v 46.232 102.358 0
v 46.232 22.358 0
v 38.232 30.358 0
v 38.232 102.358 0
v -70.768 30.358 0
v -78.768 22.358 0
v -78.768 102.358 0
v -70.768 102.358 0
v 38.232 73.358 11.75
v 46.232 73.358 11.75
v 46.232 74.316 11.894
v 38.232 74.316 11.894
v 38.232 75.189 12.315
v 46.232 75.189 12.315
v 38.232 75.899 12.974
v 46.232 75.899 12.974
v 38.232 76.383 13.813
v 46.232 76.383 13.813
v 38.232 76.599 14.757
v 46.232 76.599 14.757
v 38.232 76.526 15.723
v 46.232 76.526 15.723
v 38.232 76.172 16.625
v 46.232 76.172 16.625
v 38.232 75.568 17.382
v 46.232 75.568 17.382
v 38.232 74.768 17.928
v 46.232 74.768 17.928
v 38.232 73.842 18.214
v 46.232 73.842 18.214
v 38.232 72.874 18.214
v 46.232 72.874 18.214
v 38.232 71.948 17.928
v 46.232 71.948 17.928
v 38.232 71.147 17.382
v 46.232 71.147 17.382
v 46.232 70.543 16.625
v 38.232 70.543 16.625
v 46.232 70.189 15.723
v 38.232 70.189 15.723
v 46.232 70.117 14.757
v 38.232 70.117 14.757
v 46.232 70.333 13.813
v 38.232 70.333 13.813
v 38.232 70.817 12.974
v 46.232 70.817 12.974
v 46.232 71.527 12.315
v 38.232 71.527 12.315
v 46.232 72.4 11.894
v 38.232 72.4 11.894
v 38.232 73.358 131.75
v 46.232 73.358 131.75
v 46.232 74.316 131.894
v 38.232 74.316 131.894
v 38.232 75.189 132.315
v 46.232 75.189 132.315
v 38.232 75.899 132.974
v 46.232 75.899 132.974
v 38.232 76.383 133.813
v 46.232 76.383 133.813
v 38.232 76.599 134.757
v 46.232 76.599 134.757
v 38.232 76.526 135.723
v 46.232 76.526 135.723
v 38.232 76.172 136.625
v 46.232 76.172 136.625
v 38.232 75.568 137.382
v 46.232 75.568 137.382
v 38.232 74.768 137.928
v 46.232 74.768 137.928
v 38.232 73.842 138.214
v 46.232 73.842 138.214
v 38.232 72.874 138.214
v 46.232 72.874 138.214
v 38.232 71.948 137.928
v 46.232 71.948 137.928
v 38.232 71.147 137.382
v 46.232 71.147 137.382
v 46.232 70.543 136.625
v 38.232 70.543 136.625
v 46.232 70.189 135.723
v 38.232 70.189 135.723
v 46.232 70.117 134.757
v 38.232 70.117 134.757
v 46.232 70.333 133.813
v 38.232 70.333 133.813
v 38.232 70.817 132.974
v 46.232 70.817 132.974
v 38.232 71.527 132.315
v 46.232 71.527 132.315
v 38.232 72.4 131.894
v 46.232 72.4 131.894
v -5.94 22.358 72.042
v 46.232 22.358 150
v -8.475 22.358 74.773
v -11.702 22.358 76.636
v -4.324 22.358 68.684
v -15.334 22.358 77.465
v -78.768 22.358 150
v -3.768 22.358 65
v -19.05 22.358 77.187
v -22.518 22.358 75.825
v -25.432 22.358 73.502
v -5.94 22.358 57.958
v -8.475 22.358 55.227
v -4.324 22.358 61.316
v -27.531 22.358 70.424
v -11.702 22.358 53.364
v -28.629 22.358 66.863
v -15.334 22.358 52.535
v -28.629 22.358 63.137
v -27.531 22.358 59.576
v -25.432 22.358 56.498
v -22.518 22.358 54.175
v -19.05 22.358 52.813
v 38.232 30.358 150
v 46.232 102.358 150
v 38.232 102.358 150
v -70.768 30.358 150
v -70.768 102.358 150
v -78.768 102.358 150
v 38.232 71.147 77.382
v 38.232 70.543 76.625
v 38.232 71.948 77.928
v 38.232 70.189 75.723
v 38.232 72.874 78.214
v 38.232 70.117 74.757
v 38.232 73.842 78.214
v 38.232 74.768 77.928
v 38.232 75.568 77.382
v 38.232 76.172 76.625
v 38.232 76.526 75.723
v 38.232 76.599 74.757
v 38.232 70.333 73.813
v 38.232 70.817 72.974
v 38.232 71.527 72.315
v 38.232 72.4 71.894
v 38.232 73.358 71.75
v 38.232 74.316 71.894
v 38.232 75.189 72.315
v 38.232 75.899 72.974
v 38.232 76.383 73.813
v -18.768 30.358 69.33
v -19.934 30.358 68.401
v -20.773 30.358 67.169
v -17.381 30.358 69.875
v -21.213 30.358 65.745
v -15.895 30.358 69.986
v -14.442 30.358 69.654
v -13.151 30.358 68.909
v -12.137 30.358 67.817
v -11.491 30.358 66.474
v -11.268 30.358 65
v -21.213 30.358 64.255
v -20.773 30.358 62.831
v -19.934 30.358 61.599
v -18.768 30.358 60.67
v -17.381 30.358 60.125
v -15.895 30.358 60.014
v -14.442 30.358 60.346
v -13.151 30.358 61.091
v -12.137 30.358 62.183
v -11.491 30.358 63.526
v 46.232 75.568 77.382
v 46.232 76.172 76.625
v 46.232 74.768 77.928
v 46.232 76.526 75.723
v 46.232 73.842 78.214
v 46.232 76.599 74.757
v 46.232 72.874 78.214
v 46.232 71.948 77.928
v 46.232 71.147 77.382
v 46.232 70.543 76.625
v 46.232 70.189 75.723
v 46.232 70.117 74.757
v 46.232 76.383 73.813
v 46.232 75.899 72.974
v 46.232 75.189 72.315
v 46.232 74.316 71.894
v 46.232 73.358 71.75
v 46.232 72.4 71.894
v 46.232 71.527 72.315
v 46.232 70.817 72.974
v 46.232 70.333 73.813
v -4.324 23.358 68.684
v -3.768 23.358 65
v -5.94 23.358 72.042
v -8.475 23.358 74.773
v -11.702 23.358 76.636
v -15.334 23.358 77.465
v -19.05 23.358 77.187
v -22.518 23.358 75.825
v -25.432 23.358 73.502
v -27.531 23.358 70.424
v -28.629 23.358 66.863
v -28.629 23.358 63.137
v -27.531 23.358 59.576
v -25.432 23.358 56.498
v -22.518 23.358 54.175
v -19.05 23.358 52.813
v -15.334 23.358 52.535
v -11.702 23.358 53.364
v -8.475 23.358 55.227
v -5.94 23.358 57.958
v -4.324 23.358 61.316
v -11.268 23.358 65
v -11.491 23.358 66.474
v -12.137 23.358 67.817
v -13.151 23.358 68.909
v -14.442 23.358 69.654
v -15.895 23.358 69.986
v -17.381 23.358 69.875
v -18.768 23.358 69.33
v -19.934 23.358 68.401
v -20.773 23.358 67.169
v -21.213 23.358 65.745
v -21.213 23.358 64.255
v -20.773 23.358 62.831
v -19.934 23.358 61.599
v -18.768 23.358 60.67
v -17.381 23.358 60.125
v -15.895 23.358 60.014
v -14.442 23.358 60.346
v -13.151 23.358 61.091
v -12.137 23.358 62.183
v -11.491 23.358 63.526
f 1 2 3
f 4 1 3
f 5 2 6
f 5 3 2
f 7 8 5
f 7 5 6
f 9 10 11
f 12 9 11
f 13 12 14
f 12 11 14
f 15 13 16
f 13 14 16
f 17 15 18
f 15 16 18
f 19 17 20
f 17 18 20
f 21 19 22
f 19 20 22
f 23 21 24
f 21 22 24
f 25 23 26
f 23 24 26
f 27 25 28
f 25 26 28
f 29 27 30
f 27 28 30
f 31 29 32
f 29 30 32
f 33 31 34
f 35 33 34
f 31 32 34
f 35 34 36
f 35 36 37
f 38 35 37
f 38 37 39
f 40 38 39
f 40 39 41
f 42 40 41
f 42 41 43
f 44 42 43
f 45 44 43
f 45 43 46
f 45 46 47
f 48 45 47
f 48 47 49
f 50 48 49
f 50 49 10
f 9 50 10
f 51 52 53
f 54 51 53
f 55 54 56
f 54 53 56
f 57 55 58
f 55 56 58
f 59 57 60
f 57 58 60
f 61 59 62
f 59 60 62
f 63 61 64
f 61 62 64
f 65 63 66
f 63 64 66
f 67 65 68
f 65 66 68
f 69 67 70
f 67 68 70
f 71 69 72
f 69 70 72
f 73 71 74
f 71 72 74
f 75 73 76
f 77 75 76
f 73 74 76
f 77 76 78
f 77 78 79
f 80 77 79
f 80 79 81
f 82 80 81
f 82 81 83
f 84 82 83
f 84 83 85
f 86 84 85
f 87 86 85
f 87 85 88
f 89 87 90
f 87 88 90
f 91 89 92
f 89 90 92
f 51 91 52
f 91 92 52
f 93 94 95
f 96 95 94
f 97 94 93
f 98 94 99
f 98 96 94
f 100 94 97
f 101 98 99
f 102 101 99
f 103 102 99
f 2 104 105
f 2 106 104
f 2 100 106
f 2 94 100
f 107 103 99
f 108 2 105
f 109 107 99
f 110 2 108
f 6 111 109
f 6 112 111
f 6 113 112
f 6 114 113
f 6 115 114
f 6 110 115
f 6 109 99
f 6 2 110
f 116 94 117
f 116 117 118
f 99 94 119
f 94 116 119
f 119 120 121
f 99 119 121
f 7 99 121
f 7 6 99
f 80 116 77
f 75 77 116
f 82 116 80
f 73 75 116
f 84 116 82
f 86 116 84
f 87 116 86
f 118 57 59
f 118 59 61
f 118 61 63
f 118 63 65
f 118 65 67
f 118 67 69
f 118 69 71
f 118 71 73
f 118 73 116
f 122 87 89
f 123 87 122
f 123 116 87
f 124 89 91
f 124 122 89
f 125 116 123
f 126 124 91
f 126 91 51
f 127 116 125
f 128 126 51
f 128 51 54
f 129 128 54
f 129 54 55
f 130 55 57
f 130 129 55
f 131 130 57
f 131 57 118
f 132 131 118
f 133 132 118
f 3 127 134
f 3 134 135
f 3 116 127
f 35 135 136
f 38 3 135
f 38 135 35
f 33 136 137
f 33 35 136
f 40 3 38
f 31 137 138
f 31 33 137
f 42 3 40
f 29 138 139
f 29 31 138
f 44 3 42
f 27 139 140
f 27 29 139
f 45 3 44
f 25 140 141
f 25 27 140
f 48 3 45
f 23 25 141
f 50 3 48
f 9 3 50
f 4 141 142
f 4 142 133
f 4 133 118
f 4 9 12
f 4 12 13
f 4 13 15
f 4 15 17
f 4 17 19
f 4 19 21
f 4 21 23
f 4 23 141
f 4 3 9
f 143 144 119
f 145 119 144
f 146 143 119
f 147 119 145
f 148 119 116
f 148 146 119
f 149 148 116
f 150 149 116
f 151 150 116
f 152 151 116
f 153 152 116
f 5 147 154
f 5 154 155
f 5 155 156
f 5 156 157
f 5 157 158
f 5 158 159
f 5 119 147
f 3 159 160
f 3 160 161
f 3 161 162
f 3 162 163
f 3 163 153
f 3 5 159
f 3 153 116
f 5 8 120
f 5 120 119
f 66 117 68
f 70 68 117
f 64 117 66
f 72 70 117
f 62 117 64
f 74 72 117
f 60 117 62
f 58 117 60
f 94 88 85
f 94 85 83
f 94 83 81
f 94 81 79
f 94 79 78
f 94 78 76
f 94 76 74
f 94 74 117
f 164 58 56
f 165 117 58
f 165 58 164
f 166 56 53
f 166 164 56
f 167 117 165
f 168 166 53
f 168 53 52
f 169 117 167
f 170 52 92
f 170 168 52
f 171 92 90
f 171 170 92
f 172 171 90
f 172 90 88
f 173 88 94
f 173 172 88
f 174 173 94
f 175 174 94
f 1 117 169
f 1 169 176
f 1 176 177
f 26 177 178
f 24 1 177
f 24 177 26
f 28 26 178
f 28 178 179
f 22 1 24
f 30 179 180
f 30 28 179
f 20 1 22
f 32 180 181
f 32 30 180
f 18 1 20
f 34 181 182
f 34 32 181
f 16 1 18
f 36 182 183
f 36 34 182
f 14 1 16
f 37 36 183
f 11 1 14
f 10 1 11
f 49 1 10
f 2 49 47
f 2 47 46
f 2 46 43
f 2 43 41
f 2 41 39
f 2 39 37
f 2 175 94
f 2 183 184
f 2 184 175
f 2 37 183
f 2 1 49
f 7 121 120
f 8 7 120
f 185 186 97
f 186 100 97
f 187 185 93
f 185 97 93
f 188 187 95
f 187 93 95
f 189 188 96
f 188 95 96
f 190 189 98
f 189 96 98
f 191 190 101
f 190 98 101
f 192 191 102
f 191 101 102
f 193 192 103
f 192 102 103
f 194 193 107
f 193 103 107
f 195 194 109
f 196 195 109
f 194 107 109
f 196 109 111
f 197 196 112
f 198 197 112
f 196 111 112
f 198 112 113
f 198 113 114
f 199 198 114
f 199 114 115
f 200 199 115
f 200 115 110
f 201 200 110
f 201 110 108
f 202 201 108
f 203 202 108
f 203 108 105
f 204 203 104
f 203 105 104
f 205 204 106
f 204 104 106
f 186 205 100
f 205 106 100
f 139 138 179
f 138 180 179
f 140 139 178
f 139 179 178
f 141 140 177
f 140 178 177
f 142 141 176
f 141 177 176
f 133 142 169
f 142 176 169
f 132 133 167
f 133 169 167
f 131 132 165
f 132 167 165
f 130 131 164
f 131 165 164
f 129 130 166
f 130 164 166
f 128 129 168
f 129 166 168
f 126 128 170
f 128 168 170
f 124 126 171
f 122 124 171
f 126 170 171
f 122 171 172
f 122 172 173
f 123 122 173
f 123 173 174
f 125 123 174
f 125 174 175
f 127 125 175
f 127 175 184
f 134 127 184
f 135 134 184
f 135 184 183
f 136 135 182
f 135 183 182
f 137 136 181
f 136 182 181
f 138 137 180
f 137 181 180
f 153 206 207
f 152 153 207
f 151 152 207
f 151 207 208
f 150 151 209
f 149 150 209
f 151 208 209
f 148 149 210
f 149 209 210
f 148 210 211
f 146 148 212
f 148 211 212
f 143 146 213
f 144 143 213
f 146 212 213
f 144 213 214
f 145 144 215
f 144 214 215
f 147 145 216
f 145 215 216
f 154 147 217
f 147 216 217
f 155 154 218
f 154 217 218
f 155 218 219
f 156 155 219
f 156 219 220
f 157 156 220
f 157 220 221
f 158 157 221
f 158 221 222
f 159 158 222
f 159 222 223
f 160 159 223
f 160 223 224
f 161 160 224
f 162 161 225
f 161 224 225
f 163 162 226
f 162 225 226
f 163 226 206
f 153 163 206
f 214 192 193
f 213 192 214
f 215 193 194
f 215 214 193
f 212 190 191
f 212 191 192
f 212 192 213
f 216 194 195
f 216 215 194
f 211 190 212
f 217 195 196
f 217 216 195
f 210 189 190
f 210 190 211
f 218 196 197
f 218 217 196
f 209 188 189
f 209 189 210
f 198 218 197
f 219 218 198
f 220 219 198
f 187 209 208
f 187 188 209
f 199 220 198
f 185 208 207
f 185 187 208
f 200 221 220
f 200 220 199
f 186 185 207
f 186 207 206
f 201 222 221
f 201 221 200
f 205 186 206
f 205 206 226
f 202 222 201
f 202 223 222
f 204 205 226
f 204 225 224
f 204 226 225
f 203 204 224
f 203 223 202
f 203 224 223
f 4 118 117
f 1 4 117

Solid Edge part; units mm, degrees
sketch "Sketch1" plane through (0, 0, 0) normal (0, 0, 1) x (1, 0, 0)
  line L0 (-78.7684, 102.3579) -> (-70.7684, 102.3579)
  line L1 (-70.7684, 102.3579) -> (-70.7684, 30.3579)
  line L2 (-70.7684, 30.3579) -> (38.2316, 30.3579)
  line L3 (38.2316, 30.3579) -> (38.2316, 102.3579)
  line L4 (38.2316, 102.3579) -> (46.2316, 102.3579)
  line L5 (46.2316, 102.3579) -> (46.2316, 22.3579)
  line L6 (46.2316, 22.3579) -> (-78.7684, 22.3579)
  line L7 (-78.7684, 22.3579) -> (-78.7684, 102.3579)
  dimension "D1" = 8
  dimension "D2" = 8
  dimension "D3" = 125
  dimension "D4" = 8
  dimension "D5" = 80
extrude "Protrusion1" add sketch "Sketch1" along normal blind 150
sketch "Sketch2" plane through (-16.2684, 22.3579, 75) normal (0, -1, 0) x (1, 0, 0)
  circle A0 centre (0, -10) radius 5
  dimension "D1" = 10
  dimension "D2" = 125
  dimension "D3" = 62.5
  dimension "D4" = 150
  dimension "D5" = 85
extrude "Cutout1" cut sketch "Sketch2" against normal through all
sketch "Sketch3" plane through (-16.2684, 22.3579, 75) normal (0, -1, 0) x (1, 0, 0)
  circle A0 centre (0, -10) radius 12.5
  dimension "D1" = 25
extrude "ExtrudedCutout_2" cut sketch "Sketch3" against normal blind 1
hole "Hole_1" at (46.2316, 73.3579, 75) direction (-1, 0, 0) diameter 6.5 end up to next
hole "Hole1" at (46.2316, 73.3579, 15) direction (-1, 0, 0) diameter 6.5 end up to next
hole "Hole2" at (46.2316, 73.3579, 135) direction (-1, 0, 0) diameter 6.5 end up to next
properties material "Aluminum, 6061-T6"
